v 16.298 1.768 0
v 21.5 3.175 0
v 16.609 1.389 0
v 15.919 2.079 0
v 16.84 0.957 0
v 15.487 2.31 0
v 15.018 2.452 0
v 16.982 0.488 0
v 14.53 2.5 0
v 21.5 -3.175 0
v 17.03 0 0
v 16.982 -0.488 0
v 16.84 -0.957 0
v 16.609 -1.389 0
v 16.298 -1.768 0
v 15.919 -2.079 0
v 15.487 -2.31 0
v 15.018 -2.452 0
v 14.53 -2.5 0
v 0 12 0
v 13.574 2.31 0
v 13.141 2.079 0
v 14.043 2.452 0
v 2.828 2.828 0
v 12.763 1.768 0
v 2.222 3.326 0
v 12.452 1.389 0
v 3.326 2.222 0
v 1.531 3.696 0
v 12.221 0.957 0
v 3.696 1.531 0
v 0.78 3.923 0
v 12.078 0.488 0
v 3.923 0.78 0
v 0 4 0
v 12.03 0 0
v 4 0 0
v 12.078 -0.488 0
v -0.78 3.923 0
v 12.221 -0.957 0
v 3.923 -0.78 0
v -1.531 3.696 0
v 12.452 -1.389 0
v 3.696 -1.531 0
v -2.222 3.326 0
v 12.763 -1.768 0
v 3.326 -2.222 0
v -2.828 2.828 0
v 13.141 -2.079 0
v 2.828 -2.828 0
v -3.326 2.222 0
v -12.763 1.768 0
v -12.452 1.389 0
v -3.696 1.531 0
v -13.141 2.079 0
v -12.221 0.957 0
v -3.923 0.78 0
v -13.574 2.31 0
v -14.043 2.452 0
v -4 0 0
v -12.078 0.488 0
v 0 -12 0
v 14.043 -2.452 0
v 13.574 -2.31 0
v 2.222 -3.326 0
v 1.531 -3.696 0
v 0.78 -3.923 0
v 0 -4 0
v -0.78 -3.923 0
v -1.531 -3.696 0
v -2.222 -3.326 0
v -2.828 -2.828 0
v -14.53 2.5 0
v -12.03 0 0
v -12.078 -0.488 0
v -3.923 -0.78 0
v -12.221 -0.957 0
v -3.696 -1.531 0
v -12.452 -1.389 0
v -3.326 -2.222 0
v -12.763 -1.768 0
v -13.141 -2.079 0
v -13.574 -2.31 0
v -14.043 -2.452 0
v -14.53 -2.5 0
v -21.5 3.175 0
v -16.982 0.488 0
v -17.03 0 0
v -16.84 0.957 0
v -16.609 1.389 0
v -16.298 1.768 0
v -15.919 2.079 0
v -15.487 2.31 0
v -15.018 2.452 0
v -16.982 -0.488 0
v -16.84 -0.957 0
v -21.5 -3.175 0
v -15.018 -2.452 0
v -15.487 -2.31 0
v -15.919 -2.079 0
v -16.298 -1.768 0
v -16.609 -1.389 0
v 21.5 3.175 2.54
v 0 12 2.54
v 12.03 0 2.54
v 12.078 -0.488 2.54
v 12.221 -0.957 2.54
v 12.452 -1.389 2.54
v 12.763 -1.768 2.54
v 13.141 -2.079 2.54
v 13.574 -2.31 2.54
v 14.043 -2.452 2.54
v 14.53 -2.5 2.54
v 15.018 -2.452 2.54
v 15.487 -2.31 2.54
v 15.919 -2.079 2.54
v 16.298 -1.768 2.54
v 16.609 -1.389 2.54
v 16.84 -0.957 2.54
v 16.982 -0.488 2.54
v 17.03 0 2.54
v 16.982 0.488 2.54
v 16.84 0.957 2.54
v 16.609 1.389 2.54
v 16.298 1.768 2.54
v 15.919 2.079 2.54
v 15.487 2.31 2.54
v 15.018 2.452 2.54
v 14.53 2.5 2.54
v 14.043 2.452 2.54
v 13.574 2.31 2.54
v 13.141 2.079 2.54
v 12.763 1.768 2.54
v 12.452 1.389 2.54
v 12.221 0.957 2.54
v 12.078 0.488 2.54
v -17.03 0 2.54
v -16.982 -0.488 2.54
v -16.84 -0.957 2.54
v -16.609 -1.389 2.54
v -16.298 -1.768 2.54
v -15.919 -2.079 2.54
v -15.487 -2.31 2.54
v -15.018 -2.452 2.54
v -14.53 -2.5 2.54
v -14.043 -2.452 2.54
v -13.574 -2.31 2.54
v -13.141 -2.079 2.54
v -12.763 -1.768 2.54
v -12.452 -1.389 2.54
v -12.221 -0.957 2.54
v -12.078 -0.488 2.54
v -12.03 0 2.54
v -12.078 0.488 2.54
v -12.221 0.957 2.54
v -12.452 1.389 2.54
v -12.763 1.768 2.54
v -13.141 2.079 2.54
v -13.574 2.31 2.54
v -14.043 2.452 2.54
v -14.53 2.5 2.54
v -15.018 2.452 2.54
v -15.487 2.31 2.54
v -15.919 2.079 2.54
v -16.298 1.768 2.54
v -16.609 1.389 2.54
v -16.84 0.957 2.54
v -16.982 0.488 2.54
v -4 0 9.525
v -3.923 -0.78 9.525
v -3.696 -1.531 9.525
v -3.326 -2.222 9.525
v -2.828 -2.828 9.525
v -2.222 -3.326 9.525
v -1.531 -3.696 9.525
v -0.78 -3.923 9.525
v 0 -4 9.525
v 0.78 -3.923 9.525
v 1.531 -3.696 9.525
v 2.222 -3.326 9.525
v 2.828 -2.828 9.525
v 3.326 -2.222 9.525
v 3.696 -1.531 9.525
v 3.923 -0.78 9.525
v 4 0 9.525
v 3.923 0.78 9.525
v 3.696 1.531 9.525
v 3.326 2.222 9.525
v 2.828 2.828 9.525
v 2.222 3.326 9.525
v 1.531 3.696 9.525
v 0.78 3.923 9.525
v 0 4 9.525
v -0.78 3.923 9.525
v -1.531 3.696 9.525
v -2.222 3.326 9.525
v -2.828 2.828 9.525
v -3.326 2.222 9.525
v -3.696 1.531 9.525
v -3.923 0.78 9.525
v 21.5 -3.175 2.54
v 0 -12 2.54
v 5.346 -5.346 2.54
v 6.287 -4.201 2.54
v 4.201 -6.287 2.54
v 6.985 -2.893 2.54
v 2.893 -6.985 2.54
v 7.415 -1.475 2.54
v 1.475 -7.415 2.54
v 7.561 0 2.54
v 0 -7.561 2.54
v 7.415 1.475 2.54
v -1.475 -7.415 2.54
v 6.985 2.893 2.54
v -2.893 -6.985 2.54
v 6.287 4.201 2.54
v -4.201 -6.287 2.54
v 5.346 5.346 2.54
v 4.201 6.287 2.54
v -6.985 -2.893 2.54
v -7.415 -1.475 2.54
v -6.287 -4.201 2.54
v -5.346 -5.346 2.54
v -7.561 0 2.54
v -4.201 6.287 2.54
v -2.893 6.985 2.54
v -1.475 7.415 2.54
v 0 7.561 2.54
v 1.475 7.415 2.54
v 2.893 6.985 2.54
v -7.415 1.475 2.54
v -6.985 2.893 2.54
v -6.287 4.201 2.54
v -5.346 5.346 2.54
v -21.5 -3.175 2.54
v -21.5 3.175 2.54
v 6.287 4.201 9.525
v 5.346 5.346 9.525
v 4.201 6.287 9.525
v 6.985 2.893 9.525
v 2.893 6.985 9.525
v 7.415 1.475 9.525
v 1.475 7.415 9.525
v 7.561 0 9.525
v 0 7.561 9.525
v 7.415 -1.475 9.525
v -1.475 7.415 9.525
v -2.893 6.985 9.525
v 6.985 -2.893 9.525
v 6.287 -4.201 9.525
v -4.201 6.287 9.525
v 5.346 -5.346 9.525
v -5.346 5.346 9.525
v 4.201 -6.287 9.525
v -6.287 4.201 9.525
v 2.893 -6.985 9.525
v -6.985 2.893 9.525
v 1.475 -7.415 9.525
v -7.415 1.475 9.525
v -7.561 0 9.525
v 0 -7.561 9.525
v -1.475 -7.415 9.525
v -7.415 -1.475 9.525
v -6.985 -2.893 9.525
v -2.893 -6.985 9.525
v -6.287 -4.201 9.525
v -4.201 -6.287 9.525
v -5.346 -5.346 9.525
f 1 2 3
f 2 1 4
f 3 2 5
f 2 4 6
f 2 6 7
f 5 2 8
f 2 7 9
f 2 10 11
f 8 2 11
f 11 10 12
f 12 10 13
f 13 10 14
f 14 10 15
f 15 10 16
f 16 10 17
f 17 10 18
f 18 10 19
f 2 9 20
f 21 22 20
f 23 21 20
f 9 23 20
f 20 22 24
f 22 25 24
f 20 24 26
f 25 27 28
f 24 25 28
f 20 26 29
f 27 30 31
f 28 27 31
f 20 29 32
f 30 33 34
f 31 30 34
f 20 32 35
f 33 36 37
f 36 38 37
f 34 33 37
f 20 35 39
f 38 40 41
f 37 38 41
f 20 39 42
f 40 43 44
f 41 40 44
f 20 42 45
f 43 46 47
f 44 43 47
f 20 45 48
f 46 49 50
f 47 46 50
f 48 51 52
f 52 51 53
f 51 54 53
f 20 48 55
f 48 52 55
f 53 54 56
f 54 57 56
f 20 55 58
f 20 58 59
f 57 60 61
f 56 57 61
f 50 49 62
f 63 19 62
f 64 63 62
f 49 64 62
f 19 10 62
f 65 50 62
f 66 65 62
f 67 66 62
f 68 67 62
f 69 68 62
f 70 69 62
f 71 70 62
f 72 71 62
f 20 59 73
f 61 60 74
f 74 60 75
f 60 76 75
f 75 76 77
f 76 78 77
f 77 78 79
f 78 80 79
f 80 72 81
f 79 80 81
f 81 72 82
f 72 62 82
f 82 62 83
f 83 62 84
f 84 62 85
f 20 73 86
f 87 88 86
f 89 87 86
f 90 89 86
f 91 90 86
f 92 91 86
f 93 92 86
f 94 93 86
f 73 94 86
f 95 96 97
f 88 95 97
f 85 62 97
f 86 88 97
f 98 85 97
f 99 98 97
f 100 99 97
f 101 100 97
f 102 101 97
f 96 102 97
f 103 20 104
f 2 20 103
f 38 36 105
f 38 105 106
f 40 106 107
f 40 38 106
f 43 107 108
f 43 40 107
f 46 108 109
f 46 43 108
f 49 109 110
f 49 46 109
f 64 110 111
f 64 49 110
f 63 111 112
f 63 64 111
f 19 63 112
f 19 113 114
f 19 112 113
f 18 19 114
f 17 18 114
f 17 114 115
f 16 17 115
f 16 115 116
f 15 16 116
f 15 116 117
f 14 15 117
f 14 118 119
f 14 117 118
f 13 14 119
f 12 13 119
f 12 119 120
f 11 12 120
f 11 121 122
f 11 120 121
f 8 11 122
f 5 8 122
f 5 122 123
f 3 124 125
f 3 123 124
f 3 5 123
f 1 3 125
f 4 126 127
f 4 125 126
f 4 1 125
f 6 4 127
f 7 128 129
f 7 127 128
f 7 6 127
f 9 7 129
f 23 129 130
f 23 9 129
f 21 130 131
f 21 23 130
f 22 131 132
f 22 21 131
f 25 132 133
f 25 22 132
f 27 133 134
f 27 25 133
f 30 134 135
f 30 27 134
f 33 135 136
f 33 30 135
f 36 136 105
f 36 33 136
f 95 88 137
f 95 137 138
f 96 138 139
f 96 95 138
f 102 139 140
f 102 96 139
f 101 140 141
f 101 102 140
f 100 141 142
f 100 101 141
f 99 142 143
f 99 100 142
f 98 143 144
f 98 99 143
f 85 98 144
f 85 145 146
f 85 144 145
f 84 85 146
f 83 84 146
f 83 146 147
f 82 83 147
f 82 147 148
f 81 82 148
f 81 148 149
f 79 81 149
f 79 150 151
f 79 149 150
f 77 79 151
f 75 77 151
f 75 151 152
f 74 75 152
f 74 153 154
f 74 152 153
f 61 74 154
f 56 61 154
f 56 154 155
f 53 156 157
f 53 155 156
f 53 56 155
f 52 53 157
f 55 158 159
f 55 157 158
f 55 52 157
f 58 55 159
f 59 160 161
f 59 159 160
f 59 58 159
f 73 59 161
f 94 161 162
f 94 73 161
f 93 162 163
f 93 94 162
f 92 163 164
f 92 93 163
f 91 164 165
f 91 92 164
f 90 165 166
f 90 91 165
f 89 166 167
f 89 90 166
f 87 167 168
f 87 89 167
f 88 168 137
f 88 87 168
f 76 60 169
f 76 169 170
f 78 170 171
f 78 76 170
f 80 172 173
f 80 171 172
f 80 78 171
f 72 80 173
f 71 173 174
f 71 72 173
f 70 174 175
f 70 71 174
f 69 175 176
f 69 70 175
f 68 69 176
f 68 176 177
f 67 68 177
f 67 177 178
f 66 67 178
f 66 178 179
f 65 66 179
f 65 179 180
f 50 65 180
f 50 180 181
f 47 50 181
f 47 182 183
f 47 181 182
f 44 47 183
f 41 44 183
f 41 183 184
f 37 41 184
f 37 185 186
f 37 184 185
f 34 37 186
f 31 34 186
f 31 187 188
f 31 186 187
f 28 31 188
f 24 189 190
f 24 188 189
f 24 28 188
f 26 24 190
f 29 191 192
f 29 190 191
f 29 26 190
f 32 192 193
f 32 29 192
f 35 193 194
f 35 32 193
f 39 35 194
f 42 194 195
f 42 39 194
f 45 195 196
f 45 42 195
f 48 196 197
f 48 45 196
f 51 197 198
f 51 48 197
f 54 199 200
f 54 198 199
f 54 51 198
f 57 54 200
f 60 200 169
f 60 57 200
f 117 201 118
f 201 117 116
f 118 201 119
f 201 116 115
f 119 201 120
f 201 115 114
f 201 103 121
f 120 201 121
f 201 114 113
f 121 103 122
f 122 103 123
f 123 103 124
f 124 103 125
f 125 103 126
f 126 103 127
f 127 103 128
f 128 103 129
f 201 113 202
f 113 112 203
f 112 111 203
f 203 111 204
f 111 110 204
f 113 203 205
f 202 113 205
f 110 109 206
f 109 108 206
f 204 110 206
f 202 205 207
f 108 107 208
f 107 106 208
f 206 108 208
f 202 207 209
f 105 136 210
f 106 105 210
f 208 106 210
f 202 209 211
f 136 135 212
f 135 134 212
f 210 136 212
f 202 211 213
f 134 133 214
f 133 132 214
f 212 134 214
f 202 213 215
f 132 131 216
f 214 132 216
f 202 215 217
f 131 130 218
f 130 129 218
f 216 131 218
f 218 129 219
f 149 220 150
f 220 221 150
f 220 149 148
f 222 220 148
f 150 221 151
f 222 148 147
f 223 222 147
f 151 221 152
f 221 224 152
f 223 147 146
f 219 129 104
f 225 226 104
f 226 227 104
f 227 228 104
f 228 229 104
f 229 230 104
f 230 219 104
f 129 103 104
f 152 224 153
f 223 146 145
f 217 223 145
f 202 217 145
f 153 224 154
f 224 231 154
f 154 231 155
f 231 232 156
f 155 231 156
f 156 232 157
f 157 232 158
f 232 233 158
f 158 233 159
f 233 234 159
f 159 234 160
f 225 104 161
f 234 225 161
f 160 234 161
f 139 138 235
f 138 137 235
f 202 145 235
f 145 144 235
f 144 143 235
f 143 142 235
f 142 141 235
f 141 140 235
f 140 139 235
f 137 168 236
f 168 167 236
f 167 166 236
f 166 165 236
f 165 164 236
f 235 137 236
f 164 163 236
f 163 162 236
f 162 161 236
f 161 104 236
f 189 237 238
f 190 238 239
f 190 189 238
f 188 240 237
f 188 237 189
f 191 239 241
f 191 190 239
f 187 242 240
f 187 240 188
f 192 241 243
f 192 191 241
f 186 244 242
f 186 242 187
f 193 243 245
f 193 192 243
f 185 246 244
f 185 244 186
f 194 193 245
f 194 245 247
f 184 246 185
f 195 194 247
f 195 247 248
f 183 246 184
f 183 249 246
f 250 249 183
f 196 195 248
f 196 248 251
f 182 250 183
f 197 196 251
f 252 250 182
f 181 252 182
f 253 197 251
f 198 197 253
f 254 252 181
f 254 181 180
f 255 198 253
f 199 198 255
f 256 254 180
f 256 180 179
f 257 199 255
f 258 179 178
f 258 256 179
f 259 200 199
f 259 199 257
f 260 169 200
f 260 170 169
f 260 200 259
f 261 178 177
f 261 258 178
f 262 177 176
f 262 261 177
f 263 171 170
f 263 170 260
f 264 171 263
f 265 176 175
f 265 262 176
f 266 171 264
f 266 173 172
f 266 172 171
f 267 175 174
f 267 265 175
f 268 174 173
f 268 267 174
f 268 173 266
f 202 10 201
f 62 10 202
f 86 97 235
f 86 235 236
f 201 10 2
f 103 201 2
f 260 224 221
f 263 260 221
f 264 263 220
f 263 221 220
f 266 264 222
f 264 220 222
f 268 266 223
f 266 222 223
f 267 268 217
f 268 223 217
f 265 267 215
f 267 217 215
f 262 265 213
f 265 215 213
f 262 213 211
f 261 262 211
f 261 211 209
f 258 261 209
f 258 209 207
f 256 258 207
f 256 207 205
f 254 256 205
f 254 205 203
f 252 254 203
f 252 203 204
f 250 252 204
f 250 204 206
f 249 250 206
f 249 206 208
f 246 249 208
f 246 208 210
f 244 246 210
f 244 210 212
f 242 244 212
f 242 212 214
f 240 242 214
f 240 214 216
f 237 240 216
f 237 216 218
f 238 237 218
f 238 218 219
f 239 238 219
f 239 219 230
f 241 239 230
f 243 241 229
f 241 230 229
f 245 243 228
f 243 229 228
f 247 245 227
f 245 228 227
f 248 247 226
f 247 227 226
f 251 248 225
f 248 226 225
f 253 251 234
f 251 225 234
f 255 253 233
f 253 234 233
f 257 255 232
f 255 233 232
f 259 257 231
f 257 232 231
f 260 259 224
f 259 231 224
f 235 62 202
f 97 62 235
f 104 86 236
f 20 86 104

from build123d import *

# Parameters (mm, degrees)
BOSS_EXTRUDE1_DEPTH     = 2.54
SKETCH1_4_R             = 7.560754729
BOSS_EXTRUDE2_DEPTH     = 9.525
CUT_EXTRUDE1_DEPTH      = 27.400295926
CUT_EXTRUDE1_DEPTH_BACK = 9.525
SKETCH1_8_R             = 4
SKETCH1_8_R_2           = 2.5


with BuildPart() as part:
    # Sketch1 → Boss-Extrude1 (new body)
    with BuildSketch(Plane.XY):
        Polygon((-21.5, 3.175), (0, 12), (21.5, 3.175), (21.5, 0), (21.5, -3.175), (0, -12), (-21.5, -3.175), align=None)
    extrude(amount=BOSS_EXTRUDE1_DEPTH)

    # Sketch1<4> → Boss-Extrude2 (add)
    with BuildSketch(Plane.XY):
        Circle(SKETCH1_4_R)
    extrude(amount=BOSS_EXTRUDE2_DEPTH)

    # Sketch1<8> → Cut-Extrude1 (cut, two sides: drawn at the far end of the back side and taken through both)
    with BuildSketch(Plane.XY.offset(-CUT_EXTRUDE1_DEPTH_BACK)):
        Circle(SKETCH1_8_R)
        with Locations((-14.530377365, 0)):
            Circle(SKETCH1_8_R_2)
        with Locations((14.530377365, 0)):
            Circle(SKETCH1_8_R_2)
    extrude(amount=CUT_EXTRUDE1_DEPTH + CUT_EXTRUDE1_DEPTH_BACK, mode=Mode.SUBTRACT)


solid = part.part
